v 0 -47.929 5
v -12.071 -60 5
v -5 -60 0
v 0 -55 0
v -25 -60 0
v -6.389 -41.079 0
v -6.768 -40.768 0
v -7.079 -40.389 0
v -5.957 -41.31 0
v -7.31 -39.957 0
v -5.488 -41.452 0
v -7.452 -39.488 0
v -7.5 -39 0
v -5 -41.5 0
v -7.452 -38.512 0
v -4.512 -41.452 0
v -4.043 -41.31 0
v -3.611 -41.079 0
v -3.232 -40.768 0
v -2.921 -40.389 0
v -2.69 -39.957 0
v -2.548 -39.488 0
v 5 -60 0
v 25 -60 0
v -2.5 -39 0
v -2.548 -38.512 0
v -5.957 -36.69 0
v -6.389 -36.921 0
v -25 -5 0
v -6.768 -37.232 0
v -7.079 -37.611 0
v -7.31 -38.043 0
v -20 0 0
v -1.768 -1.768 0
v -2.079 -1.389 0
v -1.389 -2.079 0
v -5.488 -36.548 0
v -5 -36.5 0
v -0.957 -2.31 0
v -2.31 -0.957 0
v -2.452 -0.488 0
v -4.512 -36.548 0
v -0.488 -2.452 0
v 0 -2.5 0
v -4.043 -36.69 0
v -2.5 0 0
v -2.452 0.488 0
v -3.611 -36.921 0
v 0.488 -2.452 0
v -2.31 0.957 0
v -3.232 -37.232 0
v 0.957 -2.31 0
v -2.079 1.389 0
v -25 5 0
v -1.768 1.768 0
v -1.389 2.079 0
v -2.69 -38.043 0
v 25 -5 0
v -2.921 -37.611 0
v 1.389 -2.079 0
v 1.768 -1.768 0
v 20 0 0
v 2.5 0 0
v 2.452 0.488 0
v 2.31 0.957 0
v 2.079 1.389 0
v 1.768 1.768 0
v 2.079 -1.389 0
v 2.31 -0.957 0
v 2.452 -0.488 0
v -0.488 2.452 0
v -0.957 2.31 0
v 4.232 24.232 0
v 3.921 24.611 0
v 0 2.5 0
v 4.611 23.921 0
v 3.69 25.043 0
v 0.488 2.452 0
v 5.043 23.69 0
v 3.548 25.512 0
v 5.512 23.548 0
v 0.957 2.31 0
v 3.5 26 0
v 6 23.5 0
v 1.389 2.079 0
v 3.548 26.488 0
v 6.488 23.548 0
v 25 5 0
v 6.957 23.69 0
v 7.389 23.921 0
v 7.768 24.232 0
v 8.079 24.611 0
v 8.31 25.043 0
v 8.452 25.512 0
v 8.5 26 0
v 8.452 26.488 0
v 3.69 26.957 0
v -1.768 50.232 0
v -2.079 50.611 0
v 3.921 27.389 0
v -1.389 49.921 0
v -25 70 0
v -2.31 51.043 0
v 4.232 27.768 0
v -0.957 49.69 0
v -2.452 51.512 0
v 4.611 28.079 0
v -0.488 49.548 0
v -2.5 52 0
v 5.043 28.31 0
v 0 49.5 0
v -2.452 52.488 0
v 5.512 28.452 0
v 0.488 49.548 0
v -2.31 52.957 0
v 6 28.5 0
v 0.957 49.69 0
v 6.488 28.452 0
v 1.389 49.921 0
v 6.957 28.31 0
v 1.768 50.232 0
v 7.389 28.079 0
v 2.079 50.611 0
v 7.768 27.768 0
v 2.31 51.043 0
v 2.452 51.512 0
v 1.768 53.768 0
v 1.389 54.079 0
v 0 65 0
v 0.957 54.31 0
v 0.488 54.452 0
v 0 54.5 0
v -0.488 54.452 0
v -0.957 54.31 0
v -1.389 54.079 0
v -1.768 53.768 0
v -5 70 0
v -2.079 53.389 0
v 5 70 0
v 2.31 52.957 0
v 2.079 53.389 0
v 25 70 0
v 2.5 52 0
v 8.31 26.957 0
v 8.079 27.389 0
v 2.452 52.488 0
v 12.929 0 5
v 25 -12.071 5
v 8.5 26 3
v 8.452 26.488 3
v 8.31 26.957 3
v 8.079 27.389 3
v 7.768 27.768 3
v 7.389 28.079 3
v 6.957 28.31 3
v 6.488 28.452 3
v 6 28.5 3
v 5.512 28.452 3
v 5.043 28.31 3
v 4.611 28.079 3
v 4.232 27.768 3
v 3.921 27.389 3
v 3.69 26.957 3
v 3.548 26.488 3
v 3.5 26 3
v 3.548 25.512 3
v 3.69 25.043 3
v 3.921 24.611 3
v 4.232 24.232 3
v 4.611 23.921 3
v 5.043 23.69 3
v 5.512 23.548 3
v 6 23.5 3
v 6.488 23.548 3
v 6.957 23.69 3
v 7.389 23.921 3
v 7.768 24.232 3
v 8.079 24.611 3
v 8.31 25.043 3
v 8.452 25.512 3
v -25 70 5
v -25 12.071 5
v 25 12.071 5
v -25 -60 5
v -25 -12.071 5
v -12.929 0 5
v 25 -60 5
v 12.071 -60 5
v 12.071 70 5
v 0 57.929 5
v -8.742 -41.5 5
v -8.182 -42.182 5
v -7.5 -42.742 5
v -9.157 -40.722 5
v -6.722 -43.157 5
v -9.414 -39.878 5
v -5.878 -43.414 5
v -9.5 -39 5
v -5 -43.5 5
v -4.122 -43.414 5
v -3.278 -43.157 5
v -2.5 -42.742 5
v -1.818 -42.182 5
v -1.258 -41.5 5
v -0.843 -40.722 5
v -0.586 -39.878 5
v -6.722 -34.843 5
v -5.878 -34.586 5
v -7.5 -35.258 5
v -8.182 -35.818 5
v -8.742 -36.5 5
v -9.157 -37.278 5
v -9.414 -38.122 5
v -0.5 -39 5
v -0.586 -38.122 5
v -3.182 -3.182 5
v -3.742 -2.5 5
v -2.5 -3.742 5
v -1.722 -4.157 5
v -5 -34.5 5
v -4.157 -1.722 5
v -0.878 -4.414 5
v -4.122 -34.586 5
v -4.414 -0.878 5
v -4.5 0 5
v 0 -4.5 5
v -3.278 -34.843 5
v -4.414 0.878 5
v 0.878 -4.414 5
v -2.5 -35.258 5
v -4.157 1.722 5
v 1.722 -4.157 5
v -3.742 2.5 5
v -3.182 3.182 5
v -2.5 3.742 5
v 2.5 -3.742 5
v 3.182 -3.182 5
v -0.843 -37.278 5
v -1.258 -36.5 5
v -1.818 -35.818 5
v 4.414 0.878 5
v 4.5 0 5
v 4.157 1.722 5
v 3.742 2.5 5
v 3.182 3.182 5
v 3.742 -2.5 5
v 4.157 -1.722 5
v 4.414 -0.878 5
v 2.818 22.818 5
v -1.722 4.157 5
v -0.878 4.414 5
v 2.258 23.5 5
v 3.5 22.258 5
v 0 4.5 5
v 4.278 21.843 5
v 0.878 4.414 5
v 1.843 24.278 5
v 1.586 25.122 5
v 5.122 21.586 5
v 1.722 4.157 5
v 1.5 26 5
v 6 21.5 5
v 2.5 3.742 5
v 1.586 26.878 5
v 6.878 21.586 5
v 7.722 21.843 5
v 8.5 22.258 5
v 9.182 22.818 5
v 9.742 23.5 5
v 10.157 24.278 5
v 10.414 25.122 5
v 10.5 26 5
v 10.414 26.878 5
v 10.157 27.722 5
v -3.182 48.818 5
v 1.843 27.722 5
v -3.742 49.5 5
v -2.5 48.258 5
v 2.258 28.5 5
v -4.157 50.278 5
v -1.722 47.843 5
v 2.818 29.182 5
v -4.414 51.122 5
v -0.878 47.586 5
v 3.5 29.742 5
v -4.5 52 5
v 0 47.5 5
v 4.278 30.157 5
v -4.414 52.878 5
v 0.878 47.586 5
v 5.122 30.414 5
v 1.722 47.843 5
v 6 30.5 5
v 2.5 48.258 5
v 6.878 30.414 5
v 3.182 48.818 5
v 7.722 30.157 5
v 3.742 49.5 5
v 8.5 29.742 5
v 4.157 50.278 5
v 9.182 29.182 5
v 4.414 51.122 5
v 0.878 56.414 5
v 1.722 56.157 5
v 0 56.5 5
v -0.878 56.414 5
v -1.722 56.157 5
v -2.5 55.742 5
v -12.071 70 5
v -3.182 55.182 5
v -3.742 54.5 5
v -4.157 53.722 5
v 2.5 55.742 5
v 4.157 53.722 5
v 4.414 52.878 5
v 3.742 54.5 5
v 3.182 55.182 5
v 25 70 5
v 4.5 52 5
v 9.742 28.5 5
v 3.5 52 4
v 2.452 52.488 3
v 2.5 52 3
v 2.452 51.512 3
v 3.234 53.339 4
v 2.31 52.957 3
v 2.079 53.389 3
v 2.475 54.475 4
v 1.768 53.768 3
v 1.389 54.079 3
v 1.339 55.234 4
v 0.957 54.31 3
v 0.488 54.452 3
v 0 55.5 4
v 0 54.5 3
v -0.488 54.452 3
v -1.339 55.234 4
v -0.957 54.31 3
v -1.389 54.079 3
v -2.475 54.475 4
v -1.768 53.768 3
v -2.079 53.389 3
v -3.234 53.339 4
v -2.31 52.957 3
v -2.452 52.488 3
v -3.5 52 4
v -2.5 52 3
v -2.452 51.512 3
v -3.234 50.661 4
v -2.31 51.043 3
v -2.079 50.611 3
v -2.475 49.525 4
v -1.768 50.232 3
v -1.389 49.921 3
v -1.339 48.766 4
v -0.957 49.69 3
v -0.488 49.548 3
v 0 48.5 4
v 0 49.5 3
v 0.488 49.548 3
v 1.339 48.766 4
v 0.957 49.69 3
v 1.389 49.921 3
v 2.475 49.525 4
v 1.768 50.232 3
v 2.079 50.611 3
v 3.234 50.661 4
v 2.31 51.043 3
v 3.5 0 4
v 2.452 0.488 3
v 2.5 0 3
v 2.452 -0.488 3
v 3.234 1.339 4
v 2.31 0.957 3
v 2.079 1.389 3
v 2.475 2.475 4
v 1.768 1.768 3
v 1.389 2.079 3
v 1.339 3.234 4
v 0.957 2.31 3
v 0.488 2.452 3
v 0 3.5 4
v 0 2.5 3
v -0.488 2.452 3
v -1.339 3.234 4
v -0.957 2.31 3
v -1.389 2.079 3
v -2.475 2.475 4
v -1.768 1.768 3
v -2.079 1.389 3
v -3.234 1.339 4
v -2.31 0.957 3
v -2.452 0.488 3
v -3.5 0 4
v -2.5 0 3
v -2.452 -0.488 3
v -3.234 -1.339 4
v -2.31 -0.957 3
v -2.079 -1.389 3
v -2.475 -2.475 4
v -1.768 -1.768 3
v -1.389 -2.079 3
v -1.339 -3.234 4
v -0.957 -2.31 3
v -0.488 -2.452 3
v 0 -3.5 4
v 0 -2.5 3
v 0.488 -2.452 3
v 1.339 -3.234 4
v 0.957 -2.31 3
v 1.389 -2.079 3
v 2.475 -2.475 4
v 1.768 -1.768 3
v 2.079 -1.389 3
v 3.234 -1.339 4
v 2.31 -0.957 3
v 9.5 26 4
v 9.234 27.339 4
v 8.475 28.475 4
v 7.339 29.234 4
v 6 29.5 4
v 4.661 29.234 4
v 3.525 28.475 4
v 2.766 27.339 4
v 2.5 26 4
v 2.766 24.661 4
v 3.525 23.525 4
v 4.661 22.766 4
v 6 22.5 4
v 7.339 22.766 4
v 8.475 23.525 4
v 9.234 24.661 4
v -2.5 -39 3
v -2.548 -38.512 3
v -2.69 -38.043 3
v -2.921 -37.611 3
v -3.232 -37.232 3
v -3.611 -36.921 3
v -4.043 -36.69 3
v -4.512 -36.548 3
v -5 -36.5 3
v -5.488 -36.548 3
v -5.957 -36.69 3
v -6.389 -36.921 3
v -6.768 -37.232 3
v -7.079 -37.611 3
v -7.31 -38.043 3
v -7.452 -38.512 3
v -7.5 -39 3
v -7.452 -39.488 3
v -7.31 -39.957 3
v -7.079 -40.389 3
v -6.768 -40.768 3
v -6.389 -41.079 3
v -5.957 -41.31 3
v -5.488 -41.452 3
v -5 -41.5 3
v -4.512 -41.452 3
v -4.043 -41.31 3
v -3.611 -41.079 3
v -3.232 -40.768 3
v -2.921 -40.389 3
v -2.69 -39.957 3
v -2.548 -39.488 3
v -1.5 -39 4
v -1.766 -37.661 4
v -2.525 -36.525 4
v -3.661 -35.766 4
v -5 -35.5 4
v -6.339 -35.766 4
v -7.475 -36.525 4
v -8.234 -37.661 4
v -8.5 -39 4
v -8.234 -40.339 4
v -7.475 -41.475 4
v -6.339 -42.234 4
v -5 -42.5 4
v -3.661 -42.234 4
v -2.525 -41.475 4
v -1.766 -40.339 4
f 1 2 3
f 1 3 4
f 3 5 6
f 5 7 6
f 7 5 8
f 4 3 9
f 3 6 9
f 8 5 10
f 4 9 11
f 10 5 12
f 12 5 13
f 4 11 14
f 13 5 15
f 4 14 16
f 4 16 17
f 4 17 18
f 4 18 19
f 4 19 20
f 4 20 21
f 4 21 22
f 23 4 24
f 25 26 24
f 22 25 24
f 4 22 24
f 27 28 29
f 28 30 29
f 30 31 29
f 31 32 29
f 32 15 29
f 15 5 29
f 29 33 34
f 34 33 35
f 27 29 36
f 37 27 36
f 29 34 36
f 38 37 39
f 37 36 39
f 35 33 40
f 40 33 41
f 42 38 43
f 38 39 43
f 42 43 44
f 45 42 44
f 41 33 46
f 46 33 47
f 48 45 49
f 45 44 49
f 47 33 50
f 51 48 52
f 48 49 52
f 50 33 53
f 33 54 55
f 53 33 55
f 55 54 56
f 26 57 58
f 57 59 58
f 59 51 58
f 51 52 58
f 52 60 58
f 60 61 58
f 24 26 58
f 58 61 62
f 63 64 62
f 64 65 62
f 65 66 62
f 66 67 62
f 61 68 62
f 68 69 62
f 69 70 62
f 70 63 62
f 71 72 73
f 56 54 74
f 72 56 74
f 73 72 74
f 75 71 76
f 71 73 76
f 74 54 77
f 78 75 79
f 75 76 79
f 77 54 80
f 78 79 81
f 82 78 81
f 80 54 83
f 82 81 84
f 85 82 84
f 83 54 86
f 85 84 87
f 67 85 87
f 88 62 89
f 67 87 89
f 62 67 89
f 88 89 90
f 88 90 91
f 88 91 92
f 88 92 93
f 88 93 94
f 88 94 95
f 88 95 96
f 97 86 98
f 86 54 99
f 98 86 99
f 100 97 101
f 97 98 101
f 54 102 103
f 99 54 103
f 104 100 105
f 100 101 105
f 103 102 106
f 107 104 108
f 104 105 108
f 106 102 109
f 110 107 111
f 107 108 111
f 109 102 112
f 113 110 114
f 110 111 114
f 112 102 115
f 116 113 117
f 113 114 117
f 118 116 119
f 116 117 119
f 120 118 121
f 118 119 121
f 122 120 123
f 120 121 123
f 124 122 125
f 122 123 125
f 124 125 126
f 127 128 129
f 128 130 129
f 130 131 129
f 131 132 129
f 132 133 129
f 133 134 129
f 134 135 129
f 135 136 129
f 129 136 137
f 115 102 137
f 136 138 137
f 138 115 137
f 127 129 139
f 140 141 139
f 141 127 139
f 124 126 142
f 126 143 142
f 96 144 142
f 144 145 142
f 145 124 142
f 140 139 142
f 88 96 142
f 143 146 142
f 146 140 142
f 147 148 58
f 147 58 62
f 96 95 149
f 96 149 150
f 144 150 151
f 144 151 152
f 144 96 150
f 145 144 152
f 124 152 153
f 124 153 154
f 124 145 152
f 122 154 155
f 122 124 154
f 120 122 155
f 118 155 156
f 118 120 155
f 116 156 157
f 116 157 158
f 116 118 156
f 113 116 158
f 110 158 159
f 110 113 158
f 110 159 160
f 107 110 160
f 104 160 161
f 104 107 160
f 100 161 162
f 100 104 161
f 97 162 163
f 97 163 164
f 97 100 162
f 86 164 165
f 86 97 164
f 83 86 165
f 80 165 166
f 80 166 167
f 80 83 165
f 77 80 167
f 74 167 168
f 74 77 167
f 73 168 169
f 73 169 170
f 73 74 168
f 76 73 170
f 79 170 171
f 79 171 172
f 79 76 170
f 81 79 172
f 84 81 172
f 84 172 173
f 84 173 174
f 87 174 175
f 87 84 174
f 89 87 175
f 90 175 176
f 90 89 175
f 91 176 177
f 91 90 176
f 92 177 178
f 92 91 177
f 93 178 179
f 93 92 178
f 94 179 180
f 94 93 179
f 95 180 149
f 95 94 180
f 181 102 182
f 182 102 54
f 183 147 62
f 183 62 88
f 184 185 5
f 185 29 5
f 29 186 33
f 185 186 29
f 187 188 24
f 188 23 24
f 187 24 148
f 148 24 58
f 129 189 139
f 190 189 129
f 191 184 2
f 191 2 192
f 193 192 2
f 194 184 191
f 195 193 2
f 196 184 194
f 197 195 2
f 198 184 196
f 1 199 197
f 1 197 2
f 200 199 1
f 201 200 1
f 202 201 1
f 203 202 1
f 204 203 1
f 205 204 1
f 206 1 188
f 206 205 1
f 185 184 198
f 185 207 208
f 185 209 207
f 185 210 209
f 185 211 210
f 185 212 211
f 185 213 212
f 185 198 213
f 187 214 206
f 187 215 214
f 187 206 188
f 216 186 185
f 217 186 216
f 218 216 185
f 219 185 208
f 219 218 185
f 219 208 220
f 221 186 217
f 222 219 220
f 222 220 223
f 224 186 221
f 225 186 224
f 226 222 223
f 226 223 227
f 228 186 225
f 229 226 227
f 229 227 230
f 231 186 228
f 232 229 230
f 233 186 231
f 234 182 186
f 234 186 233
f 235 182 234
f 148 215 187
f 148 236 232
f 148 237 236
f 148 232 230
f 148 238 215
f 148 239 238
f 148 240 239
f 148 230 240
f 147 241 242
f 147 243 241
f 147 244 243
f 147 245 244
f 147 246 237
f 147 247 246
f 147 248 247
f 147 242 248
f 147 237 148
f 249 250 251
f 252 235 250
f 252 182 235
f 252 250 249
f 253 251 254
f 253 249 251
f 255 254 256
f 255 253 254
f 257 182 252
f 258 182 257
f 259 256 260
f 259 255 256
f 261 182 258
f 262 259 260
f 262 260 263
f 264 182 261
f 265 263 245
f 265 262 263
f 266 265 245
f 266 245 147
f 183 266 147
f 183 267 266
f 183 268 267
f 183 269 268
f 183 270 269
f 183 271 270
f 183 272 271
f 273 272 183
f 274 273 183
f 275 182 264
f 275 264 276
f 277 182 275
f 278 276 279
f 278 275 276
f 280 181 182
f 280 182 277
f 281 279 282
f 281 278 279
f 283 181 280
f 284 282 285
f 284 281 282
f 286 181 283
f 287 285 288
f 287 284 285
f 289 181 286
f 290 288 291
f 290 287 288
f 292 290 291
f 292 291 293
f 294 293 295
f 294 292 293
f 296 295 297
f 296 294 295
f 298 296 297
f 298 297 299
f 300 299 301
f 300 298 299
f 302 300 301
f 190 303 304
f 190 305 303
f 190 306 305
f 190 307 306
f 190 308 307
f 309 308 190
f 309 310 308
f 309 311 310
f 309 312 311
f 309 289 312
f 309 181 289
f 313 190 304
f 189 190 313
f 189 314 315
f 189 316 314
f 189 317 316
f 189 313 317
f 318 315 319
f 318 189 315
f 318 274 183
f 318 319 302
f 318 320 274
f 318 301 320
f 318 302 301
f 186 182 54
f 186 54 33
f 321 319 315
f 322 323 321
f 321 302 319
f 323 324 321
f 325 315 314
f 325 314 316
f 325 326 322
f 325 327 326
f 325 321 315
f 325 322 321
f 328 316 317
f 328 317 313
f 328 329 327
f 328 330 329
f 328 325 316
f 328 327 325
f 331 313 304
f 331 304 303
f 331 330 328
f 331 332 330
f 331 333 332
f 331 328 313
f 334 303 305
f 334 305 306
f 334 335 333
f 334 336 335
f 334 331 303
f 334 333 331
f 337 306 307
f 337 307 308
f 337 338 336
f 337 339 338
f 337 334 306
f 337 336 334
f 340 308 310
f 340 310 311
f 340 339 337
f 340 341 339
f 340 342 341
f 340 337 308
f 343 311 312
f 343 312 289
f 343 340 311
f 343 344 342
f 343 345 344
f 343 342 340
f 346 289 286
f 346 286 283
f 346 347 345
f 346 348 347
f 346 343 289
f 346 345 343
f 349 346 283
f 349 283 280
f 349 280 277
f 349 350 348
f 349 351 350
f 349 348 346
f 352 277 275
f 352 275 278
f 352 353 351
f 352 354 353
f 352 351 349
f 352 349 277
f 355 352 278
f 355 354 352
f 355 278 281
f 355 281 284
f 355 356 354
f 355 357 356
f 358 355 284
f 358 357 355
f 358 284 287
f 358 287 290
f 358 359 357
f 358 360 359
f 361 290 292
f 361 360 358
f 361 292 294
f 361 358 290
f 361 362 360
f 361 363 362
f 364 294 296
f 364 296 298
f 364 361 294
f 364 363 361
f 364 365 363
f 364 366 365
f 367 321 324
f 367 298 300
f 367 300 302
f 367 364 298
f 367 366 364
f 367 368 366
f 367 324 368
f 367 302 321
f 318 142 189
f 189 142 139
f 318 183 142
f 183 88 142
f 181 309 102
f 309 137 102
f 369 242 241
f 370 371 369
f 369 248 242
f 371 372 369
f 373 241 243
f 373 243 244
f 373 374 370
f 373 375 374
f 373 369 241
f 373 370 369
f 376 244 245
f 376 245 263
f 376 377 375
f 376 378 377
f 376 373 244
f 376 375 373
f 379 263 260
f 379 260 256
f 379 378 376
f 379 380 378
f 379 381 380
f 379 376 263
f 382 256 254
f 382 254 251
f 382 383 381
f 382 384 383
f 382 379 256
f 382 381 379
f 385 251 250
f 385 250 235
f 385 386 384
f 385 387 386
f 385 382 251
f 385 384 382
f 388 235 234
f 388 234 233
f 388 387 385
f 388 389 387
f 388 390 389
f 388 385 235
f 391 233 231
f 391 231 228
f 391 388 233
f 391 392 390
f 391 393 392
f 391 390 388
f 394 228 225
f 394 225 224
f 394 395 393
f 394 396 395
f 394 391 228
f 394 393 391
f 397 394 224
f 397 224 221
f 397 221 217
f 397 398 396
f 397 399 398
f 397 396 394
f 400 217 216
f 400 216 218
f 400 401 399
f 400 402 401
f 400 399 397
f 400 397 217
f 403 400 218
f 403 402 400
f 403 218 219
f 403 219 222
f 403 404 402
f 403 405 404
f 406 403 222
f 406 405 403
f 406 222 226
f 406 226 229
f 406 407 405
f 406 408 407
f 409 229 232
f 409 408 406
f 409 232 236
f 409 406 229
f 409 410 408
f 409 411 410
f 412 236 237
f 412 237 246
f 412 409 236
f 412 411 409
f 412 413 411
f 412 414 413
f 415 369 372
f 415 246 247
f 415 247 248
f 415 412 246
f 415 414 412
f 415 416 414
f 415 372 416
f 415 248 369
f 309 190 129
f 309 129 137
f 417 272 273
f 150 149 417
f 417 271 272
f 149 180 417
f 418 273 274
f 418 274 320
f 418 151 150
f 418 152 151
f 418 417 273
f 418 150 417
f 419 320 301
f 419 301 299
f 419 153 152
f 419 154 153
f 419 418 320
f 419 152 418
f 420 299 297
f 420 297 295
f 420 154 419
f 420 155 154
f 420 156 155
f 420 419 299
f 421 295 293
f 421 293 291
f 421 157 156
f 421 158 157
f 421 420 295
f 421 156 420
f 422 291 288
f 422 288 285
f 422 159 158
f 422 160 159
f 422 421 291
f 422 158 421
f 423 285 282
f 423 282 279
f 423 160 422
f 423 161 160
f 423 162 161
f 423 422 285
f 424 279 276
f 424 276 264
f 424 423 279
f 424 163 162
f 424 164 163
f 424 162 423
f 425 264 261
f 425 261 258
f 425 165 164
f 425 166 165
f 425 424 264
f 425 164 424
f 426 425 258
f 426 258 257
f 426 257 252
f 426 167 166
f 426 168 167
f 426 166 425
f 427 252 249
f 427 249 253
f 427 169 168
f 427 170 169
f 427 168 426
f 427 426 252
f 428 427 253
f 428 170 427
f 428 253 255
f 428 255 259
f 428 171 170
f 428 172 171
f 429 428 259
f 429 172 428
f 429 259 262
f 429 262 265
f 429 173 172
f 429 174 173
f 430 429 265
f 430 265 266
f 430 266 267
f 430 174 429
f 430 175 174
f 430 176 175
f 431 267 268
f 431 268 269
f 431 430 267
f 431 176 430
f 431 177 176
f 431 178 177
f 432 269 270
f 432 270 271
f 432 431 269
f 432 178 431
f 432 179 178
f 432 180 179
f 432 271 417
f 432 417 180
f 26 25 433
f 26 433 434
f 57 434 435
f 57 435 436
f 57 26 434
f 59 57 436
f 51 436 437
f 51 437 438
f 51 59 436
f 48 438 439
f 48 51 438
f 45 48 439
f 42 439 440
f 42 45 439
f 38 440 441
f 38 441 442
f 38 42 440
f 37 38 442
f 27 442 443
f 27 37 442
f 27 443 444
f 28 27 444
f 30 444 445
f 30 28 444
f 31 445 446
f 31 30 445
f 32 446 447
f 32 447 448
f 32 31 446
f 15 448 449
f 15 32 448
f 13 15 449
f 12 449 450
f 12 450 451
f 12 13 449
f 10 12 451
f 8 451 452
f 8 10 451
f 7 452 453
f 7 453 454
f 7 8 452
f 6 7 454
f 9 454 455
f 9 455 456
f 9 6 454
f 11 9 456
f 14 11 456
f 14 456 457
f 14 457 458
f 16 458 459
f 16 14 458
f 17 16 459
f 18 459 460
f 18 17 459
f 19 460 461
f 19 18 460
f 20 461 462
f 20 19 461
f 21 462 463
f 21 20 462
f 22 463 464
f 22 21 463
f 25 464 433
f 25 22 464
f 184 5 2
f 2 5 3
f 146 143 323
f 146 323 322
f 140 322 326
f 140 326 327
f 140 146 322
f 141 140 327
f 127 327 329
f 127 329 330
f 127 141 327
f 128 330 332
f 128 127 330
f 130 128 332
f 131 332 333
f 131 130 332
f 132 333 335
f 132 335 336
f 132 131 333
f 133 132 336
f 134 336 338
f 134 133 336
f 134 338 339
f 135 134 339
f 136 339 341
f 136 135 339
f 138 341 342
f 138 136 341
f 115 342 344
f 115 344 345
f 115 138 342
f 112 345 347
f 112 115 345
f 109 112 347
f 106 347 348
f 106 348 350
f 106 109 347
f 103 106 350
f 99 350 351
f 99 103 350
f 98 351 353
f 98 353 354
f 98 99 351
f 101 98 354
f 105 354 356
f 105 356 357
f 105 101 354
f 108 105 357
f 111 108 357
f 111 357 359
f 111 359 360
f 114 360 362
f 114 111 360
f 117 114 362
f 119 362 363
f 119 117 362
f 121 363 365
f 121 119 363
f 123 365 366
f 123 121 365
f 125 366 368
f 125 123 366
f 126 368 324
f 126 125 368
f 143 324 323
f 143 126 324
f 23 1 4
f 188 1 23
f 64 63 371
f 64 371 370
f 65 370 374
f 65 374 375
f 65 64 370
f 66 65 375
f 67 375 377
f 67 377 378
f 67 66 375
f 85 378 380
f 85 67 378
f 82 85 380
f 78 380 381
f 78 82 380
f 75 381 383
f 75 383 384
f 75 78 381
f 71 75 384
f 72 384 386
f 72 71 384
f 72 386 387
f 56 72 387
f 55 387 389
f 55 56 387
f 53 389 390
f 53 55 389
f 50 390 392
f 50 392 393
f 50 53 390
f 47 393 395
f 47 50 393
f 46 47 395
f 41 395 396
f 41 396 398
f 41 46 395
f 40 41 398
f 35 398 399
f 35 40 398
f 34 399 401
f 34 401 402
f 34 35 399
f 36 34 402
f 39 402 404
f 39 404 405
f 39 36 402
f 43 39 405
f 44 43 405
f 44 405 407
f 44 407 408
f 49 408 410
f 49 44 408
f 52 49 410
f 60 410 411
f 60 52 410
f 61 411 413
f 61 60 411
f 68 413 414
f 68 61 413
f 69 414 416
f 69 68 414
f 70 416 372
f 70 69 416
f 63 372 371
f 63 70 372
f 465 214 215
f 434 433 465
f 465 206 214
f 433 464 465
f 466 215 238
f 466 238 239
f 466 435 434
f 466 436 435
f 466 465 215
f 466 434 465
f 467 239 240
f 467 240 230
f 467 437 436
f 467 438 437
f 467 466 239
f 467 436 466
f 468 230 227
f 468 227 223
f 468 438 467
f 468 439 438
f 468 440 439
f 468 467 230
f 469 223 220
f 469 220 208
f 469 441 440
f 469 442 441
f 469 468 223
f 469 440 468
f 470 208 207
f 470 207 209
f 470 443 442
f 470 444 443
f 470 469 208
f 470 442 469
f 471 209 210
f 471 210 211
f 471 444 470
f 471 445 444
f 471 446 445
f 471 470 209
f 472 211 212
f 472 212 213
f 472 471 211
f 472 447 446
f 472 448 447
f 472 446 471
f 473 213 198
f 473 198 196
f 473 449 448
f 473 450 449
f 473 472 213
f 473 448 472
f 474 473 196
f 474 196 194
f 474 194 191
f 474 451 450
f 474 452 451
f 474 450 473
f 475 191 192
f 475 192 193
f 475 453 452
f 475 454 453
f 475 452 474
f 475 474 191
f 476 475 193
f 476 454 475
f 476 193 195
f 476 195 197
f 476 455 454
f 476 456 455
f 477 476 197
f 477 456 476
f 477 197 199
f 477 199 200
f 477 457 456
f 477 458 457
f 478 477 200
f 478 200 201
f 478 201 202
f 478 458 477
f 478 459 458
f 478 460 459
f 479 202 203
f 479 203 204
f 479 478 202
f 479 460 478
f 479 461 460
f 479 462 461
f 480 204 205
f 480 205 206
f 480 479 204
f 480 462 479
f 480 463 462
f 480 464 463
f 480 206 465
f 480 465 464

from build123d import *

# Parameters (mm, degrees)
F0_R     = 2.5
F1_DEPTH = 5
F2_SIZE  = 4.99999
F3_SIZE  = 2


# Not quite as in the source:
# - a fillet or chamfer is up to 0.001 mm smaller than in the source, because OpenCascade refuses the exact size


with BuildPart() as f1:
    # F0 (on Top) → F1 (new body)
    with BuildSketch(Plane.XY):
        Polygon((-5, 70), (-25, 70), (-25, 5), (-20, 0), (-25, -5), (-25, -60), (-5, -60), (0, -55), (5, -60), (25, -60), (25, -5), (20, 0), (25, 5), (25, 70), (5, 70), (0, 65), align=None)
        with Locations((-4.9999998882, -39)):
            Circle(F0_R, mode=Mode.SUBTRACT)
        Circle(F0_R, mode=Mode.SUBTRACT)
        with Locations((6, 26)):
            Circle(F0_R, mode=Mode.SUBTRACT)
        with Locations((0, 52)):
            Circle(F0_R, mode=Mode.SUBTRACT)
    extrude(amount=F1_DEPTH)

    # F2 (size 5 in the source; OpenCascade refuses exactly that, so slightly less here)
    f2_edges = [f1.edges().sort_by_distance(p)[0] for p in [
        (-2.5, 67.5, 5),
        (2.5, 67.5, 5),
        (22.5, 2.5, 5),
        (22.5, -2.5, 5),
        (-22.5, 2.5, 5),
        (-22.5, -2.5, 5),
        (-2.5, -57.5, 5),
        (2.5, -57.5, 5),
    ]]
    chamfer(f2_edges, length=F2_SIZE)

    # F3
    f3_edges = [f1.edges().sort_by_distance(p)[0] for p in [
        (-2.5, 52, 5),
        (3.5, 26, 5),
        (-7.5, -39, 5),
        (-2.5, 0, 5),
    ]]
    chamfer(f3_edges, length=F3_SIZE)


solid = f1.part
